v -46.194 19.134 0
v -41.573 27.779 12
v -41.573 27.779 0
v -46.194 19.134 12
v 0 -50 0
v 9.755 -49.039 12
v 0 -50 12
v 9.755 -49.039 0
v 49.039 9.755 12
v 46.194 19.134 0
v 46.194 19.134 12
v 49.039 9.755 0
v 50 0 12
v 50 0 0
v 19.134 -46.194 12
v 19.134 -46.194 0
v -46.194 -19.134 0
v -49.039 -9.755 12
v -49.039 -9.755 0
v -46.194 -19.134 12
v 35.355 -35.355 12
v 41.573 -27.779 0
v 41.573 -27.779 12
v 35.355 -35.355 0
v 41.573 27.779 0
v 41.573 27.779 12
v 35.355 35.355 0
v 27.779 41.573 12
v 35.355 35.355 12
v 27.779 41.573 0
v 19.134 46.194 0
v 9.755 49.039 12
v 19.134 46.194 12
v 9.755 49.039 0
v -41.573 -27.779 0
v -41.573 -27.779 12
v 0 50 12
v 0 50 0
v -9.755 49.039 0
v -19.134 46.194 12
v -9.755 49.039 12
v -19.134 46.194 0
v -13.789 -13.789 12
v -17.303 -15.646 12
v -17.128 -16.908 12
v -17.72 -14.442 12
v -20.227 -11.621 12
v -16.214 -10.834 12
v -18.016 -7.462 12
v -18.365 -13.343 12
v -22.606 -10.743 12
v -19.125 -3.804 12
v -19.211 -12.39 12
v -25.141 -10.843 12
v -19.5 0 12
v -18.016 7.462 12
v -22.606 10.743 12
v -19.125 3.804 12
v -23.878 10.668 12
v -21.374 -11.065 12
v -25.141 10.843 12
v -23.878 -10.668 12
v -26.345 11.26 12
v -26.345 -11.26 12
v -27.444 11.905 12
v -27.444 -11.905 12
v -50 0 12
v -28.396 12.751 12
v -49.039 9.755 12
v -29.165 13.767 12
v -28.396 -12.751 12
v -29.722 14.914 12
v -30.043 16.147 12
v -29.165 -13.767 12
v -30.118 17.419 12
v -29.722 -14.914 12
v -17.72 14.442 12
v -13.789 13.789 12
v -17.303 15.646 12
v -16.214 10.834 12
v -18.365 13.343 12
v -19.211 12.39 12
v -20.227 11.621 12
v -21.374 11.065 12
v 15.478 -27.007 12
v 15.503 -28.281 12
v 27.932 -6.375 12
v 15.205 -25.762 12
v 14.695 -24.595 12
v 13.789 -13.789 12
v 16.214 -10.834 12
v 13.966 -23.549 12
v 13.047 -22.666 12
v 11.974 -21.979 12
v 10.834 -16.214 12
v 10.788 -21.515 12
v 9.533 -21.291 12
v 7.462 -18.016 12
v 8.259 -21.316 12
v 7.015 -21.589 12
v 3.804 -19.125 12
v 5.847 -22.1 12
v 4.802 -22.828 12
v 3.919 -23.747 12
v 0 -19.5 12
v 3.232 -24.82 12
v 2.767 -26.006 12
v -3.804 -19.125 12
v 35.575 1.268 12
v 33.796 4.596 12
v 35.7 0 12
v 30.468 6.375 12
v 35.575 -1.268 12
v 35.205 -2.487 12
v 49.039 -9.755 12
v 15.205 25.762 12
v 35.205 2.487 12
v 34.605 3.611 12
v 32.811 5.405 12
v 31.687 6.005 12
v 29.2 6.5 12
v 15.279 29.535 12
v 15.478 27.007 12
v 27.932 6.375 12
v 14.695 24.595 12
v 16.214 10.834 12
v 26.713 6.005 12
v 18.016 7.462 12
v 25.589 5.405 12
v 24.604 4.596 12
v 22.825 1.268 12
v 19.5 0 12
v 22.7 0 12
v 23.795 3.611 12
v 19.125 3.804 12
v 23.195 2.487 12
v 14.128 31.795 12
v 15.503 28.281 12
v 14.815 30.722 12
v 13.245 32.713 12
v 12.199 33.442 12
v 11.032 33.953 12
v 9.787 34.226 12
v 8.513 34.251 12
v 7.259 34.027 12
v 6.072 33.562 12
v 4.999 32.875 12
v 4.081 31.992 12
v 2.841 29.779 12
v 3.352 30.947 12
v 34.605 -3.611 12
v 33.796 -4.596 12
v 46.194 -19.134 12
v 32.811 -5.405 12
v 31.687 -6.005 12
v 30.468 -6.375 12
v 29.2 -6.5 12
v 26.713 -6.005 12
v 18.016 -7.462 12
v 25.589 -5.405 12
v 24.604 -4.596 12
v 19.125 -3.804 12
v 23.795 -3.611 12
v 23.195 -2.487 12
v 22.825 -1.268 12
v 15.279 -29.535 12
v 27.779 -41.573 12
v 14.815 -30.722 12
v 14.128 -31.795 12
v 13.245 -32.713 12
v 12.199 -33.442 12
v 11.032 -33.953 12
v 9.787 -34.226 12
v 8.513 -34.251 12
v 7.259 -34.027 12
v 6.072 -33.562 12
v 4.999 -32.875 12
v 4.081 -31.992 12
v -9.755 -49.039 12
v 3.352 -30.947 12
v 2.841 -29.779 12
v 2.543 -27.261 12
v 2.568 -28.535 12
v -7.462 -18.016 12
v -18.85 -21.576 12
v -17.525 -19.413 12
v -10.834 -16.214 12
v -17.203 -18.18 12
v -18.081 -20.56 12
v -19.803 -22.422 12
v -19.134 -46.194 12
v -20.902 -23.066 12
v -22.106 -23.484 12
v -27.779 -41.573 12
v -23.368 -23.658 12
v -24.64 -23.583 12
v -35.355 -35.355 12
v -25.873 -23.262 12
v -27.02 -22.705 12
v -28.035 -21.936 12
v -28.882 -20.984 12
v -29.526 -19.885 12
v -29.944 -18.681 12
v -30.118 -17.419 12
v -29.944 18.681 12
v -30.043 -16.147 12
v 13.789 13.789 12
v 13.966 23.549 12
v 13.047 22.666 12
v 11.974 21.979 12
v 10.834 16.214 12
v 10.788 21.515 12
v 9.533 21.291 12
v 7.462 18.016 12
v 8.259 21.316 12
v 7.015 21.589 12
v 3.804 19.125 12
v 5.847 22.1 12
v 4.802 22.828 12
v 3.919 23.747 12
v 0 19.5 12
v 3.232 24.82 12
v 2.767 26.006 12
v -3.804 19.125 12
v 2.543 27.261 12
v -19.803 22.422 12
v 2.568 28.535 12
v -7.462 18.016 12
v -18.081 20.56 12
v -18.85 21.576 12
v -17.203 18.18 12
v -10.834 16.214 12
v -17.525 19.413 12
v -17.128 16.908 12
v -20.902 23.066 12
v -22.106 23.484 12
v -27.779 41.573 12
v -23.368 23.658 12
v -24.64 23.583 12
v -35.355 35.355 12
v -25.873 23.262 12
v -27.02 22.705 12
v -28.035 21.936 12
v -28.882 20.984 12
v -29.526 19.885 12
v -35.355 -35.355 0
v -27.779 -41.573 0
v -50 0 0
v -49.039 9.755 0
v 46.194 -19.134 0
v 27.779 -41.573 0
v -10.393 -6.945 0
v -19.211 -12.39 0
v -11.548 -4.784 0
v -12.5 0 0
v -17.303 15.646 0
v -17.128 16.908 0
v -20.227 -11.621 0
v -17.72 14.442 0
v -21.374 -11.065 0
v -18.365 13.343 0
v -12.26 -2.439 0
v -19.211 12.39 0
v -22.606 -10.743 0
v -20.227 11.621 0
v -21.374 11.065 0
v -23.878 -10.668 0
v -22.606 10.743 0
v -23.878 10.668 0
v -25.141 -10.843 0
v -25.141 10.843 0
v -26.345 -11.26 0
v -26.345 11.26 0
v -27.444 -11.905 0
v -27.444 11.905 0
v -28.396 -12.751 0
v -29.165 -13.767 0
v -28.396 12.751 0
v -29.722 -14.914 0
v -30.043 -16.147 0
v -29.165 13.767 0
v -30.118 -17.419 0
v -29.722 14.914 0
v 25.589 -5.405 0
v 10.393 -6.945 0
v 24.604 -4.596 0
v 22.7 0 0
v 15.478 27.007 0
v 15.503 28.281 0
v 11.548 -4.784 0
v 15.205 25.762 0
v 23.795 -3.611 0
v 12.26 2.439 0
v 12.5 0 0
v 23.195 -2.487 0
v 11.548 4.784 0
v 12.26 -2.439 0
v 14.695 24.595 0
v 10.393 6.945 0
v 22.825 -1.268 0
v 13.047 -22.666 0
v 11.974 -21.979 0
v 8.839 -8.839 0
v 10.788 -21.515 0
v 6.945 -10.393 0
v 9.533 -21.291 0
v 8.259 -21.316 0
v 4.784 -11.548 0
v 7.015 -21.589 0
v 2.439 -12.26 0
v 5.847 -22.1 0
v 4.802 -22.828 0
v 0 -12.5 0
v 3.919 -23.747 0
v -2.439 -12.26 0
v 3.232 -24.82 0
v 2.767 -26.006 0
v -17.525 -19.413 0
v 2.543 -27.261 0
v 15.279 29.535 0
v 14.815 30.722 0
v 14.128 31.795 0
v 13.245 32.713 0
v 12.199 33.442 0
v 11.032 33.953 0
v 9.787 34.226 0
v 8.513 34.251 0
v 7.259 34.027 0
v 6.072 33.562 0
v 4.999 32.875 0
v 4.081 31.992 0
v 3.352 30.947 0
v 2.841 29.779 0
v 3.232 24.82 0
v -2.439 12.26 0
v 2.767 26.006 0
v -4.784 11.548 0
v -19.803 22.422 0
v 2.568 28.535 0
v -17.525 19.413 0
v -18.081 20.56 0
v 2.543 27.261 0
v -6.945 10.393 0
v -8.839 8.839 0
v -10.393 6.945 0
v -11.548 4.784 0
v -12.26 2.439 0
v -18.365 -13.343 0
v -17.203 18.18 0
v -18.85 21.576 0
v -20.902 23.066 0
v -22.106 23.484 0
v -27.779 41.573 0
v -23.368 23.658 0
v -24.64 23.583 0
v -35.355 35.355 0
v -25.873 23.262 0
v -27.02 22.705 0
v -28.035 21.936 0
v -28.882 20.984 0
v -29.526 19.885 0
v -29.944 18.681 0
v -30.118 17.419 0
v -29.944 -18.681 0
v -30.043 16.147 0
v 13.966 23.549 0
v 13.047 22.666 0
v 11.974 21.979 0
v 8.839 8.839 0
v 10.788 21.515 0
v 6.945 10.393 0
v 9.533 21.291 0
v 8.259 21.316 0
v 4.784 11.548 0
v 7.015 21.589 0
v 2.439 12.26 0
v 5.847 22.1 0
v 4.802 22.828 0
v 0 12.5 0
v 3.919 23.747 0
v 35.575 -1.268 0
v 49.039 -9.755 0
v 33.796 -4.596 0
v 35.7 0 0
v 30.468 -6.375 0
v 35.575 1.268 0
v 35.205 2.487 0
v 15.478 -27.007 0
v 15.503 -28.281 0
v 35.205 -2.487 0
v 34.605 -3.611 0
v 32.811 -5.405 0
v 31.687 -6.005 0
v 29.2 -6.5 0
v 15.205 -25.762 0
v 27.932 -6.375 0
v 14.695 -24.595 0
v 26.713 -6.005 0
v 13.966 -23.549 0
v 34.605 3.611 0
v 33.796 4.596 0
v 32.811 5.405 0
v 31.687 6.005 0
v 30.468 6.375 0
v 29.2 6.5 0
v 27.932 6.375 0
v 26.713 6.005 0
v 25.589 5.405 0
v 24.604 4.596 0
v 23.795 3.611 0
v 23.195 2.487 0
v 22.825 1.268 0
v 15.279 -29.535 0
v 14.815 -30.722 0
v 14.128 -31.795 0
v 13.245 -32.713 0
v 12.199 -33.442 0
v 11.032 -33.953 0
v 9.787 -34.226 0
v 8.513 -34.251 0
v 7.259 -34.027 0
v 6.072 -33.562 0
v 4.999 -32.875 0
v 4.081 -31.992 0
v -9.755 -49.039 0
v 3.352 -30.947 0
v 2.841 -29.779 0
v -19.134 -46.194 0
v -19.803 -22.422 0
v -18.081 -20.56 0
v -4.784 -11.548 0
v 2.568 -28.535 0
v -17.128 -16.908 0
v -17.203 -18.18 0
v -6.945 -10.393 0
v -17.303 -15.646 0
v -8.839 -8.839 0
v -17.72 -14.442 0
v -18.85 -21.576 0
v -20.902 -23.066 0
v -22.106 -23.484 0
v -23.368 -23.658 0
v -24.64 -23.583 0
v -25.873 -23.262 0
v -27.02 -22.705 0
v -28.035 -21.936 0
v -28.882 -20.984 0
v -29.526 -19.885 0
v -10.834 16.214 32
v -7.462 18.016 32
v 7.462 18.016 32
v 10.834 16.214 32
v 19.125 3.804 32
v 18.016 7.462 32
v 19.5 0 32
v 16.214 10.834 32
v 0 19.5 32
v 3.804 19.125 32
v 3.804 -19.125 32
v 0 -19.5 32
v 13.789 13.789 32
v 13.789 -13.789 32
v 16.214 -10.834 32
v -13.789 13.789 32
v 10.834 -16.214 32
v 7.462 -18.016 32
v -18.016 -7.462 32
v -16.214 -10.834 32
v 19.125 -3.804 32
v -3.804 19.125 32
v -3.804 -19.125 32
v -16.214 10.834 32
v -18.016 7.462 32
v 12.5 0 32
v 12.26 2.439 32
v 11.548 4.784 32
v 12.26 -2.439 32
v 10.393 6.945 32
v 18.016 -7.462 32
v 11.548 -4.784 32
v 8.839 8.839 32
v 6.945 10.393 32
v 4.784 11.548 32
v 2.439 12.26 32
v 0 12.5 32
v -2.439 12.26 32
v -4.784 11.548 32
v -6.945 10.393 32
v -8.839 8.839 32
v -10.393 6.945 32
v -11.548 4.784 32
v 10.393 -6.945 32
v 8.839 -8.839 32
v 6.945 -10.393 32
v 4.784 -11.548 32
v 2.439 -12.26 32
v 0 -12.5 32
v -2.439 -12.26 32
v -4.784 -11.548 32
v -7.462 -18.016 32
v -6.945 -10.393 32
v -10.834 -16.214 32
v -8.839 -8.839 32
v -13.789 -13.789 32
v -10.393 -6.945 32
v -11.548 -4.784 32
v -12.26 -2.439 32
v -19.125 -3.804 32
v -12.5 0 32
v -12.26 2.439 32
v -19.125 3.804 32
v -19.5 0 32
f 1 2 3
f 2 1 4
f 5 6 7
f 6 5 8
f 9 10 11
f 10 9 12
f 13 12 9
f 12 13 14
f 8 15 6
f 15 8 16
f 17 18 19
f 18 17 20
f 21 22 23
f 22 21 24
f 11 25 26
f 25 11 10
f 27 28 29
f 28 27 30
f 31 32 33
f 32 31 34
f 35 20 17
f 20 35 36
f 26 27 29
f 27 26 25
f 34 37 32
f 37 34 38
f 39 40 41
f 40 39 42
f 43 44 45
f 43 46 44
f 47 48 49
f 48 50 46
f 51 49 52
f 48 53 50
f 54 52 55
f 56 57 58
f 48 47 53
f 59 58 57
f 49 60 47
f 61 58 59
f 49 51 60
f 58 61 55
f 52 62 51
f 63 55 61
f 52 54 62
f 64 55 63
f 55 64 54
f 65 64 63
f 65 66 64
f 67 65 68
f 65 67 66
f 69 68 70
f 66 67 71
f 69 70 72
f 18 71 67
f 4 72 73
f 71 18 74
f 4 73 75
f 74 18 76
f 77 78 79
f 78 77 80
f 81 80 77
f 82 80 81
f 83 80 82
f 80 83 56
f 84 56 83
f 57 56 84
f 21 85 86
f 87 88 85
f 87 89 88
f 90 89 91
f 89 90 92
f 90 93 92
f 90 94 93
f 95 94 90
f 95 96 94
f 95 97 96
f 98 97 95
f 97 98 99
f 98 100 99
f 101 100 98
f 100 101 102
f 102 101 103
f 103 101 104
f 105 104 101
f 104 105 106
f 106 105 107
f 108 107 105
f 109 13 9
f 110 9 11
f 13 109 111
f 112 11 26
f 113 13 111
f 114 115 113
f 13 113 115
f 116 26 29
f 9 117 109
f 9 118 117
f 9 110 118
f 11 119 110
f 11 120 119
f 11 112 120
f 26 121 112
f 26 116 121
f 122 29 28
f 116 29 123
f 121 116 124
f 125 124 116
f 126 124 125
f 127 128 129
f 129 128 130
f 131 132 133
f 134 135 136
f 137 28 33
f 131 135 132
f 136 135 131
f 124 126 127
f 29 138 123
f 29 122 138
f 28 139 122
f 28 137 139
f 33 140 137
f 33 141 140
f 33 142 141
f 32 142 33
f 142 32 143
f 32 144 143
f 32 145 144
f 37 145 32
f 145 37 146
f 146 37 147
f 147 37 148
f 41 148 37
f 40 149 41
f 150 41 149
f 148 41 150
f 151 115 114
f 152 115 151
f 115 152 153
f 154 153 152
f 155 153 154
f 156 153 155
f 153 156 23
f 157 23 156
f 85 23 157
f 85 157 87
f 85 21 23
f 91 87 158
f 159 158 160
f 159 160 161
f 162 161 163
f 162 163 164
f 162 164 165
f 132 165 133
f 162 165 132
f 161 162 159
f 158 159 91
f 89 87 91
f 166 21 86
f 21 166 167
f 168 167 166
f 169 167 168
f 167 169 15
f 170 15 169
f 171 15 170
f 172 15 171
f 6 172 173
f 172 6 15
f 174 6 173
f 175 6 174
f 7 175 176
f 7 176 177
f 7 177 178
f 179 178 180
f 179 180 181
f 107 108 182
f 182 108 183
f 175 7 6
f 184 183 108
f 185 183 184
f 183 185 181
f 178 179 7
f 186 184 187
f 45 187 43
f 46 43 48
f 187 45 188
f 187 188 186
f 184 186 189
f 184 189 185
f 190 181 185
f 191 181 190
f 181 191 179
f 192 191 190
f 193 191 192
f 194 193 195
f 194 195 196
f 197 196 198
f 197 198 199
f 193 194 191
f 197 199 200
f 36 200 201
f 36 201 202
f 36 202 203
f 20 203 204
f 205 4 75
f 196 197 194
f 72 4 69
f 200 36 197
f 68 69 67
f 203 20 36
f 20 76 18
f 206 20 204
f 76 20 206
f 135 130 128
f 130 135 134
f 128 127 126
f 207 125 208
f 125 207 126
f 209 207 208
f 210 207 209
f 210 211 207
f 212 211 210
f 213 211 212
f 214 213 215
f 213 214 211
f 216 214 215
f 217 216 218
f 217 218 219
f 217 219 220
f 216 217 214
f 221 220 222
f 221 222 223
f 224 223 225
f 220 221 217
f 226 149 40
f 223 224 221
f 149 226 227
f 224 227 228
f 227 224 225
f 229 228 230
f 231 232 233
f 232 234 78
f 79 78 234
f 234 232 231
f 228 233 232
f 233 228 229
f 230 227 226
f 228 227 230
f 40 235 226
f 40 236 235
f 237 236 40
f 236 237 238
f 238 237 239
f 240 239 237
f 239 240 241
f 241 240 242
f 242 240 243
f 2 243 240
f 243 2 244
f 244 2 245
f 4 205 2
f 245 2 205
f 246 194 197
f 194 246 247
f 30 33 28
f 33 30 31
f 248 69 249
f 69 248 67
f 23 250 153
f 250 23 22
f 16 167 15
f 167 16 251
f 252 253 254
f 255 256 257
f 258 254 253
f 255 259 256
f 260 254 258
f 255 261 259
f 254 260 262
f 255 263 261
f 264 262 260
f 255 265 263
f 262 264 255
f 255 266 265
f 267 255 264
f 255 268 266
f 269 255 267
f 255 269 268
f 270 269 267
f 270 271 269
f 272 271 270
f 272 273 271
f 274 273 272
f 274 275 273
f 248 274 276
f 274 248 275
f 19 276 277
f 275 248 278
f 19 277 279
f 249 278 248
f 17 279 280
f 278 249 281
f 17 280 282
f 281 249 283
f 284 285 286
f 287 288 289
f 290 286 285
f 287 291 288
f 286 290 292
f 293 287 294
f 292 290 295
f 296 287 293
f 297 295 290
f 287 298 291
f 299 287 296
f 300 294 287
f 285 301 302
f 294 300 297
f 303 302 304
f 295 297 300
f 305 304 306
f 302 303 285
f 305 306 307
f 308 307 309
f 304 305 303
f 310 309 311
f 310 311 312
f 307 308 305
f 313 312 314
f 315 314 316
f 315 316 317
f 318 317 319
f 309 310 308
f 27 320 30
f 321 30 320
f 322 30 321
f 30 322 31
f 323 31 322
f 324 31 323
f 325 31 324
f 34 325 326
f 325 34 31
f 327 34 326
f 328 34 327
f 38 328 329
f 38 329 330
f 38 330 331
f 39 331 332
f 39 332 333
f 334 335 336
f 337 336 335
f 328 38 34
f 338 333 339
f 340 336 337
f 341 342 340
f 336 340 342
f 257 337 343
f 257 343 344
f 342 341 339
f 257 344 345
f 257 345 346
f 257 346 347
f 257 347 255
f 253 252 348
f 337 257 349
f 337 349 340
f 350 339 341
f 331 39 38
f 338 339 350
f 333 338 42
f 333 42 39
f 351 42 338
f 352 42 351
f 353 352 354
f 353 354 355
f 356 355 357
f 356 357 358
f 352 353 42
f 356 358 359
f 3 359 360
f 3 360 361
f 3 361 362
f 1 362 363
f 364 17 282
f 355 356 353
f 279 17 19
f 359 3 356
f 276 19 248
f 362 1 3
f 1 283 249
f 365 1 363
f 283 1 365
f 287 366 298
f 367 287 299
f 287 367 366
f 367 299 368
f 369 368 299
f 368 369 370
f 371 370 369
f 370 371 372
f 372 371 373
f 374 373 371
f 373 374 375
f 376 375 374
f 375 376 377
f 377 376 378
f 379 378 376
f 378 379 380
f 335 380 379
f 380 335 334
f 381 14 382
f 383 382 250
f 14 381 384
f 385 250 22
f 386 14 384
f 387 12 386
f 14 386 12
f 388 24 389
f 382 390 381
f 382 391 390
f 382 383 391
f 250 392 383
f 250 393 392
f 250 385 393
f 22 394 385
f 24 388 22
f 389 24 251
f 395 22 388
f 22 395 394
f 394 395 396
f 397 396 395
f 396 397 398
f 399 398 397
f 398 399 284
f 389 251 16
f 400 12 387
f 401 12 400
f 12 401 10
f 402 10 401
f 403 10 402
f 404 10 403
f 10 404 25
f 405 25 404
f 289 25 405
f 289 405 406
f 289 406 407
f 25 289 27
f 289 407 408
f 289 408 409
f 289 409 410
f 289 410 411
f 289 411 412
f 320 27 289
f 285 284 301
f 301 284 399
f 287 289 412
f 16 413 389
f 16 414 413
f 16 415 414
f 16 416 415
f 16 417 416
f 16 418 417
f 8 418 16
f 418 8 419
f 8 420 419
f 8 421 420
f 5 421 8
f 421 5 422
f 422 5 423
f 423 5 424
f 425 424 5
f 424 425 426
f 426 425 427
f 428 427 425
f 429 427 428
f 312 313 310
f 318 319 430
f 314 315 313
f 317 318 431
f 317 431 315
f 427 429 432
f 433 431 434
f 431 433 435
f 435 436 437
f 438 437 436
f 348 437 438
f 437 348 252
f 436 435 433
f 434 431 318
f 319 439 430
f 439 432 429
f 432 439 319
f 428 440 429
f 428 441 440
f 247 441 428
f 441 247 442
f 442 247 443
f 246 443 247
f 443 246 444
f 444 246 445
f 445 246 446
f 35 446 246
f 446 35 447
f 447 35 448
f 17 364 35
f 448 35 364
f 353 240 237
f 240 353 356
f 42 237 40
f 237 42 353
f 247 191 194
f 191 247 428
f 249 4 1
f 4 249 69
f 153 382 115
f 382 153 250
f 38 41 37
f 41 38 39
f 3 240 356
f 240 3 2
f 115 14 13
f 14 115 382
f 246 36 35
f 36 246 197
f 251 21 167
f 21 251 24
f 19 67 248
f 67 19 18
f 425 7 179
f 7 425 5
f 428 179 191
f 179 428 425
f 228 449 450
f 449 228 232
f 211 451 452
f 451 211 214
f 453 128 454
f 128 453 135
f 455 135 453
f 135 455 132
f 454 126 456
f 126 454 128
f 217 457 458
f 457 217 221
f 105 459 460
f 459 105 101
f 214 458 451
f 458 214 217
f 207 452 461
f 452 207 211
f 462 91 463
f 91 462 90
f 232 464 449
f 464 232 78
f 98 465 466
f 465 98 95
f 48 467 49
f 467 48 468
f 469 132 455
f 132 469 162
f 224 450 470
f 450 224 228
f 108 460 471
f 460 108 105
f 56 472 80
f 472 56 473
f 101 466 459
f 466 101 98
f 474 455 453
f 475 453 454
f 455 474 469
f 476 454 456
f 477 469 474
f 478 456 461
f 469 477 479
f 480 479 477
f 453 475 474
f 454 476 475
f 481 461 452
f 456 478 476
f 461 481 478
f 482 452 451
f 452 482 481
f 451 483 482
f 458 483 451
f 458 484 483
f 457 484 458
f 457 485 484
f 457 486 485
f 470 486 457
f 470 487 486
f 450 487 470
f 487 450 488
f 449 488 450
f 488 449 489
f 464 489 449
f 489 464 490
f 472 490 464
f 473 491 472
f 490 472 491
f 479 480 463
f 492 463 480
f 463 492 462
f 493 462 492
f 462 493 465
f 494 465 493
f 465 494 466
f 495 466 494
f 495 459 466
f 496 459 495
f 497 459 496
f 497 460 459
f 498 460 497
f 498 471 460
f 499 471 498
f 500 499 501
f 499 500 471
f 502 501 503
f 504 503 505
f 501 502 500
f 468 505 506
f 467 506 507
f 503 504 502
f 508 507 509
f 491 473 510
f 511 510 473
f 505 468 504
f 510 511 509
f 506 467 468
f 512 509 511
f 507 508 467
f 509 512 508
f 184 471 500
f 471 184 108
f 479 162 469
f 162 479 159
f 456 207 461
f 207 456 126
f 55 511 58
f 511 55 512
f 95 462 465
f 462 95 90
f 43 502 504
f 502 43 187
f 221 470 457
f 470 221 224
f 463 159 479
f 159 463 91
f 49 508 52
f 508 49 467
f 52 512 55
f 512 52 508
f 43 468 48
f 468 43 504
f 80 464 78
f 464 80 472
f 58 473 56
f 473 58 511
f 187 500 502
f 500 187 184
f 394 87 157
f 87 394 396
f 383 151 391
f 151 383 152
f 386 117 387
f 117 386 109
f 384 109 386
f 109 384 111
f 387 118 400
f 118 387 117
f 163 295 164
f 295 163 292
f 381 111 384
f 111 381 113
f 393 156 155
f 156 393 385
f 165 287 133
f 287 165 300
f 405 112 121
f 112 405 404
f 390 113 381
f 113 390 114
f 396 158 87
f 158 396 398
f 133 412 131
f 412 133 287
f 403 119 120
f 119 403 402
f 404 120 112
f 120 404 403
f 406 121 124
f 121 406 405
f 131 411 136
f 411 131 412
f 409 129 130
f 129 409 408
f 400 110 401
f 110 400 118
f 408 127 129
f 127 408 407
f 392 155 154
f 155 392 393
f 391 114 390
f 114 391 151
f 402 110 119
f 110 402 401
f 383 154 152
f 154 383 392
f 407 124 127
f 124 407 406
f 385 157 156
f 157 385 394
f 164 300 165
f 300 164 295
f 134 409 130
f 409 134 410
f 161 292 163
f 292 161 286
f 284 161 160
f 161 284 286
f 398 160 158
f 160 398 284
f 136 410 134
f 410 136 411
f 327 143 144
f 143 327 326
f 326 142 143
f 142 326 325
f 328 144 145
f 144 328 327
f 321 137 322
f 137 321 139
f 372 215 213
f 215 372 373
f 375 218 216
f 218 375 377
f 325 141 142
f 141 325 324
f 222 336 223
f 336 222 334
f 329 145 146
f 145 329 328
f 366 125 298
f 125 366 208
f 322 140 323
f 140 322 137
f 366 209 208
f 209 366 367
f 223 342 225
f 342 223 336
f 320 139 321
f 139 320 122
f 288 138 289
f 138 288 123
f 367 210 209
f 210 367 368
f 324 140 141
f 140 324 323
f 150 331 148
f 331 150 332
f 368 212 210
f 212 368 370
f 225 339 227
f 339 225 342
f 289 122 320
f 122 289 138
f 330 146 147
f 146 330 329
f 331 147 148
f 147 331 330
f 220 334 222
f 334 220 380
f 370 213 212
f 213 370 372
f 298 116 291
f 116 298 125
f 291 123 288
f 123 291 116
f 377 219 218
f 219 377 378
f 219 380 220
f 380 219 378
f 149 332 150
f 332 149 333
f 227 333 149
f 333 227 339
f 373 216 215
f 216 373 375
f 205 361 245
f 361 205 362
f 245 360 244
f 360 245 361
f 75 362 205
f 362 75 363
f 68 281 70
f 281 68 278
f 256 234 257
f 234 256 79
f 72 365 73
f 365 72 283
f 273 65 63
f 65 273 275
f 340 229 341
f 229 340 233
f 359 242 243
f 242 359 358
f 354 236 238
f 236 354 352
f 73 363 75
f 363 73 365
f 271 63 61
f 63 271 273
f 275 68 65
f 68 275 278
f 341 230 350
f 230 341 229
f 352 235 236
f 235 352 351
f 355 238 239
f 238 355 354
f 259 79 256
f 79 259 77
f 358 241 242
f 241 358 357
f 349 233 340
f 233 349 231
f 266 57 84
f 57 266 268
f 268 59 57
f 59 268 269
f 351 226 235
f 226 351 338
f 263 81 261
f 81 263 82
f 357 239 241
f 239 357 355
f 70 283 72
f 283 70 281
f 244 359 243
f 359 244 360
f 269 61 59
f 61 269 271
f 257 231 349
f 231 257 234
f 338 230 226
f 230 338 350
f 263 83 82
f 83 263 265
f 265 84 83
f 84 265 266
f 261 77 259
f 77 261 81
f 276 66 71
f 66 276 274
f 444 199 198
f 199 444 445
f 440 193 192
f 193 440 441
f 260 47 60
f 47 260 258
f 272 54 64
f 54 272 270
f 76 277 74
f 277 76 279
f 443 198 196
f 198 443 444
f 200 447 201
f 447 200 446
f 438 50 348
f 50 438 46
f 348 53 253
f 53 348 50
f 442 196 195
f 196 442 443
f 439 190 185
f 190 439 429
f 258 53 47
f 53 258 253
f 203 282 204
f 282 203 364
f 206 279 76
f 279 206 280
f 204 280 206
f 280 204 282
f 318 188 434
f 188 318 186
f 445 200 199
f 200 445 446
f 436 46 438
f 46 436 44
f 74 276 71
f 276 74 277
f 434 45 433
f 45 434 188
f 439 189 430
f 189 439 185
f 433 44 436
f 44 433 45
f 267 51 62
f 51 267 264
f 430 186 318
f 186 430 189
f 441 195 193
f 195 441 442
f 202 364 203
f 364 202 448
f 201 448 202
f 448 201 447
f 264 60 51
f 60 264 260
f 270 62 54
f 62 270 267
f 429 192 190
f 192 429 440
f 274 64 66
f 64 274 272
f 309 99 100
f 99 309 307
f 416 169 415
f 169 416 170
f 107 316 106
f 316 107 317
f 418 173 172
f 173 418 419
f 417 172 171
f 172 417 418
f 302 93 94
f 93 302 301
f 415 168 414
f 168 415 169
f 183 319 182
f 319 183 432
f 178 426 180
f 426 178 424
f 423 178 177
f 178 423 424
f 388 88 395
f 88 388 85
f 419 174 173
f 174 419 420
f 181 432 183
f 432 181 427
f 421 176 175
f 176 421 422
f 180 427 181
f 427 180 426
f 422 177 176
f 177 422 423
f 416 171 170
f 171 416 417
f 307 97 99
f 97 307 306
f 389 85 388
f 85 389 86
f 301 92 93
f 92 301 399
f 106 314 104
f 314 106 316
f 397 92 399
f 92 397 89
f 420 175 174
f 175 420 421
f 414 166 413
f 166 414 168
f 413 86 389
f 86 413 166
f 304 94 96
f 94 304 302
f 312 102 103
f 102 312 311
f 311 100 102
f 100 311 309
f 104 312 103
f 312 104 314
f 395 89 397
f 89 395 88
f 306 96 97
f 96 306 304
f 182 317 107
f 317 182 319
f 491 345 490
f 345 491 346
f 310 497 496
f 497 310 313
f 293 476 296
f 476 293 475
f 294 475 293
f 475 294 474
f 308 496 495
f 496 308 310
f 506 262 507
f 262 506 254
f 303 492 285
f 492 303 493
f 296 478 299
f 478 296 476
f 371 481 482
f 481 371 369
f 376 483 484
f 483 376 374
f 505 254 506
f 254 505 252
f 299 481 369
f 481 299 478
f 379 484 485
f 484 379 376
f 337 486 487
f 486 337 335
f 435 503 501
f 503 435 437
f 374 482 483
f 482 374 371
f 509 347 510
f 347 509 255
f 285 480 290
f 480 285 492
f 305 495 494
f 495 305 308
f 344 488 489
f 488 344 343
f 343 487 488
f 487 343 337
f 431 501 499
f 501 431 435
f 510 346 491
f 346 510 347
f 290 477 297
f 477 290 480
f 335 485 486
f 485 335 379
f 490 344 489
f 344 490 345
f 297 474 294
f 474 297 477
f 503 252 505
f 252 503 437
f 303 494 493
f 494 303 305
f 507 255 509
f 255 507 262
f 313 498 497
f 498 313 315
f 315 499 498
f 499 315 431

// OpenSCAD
$fn = 32;

// ----------------------------------------------------------------------
// Bolt-circle flange: 100 mm outside, 5 bolt holes, bore 25 mm
// ----------------------------------------------------------------------

// --- parameters (mm) ---
flange_d = 100;           // flange outside diameter
flange_t = 12;            // flange thickness
bolts = 5;                // number of bolt holes
bolt_d = 13;              // bolt clearance
bolt_r = 29.2;            // bolt circle radius
bore_d = 25;              // centre bore
hub_d = 39;               // raised hub diameter
hub_h = 20;               // raised hub height

module body() {
  cylinder(h = flange_t, d = flange_d);
  /* raised hub, sunk 1 mm into the flange */
  translate([0, 0, flange_t - 1]) cylinder(h = hub_h + 1, d = hub_d);
}

difference() {
  body();
  /* bolt circle */
  for (i = [0 : bolts - 1]) rotate([0, 0, i * 360 / bolts]) translate([bolt_r, 0, -1]) cylinder(h = flange_t + hub_h + 3, d = bolt_d);
  translate([0, 0, -1]) cylinder(h = flange_t + hub_h + 3, d = bore_d);
}
